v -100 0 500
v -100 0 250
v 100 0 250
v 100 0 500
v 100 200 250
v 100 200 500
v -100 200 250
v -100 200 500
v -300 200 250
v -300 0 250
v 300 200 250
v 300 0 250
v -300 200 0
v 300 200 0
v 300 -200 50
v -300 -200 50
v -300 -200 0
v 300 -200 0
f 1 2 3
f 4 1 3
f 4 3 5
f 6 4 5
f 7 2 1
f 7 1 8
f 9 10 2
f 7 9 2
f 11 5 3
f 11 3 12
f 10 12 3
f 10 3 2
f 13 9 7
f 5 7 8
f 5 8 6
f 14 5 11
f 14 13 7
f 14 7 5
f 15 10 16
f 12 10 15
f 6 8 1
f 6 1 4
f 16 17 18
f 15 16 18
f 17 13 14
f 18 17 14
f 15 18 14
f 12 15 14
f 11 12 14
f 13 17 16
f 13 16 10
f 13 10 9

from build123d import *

# Parameters (mm, degrees)
F0_W     = 600
F0_H     = 400
F1_DEPTH = 250
F2_W     = 200
F2_H     = 200
F3_DEPTH = 250
F4_SIZE  = 199.99999


# Not quite as in the source:
# - a fillet or chamfer is up to 0.001 mm smaller than in the source, because OpenCascade refuses the exact size


with BuildPart() as f1:
    # F0 (on Top) → F1 (new body)
    with BuildSketch(Plane.XY):
        Rectangle(F0_W, F0_H)
    extrude(amount=F1_DEPTH)

    # F2 (on face) → F3 (join)
    with BuildSketch(Plane.XY.offset(250)):
        with Locations((0, 100)):
            Rectangle(F2_W, F2_H)
    extrude(amount=F3_DEPTH)

    # F4 (size 200 in the source; OpenCascade refuses exactly that, so slightly less here)
    f4_edges = [f1.edges().sort_by_distance(p)[0] for p in [
        (0, -200, 250),
    ]]
    chamfer(f4_edges, length=F4_SIZE)


solid = f1.part
